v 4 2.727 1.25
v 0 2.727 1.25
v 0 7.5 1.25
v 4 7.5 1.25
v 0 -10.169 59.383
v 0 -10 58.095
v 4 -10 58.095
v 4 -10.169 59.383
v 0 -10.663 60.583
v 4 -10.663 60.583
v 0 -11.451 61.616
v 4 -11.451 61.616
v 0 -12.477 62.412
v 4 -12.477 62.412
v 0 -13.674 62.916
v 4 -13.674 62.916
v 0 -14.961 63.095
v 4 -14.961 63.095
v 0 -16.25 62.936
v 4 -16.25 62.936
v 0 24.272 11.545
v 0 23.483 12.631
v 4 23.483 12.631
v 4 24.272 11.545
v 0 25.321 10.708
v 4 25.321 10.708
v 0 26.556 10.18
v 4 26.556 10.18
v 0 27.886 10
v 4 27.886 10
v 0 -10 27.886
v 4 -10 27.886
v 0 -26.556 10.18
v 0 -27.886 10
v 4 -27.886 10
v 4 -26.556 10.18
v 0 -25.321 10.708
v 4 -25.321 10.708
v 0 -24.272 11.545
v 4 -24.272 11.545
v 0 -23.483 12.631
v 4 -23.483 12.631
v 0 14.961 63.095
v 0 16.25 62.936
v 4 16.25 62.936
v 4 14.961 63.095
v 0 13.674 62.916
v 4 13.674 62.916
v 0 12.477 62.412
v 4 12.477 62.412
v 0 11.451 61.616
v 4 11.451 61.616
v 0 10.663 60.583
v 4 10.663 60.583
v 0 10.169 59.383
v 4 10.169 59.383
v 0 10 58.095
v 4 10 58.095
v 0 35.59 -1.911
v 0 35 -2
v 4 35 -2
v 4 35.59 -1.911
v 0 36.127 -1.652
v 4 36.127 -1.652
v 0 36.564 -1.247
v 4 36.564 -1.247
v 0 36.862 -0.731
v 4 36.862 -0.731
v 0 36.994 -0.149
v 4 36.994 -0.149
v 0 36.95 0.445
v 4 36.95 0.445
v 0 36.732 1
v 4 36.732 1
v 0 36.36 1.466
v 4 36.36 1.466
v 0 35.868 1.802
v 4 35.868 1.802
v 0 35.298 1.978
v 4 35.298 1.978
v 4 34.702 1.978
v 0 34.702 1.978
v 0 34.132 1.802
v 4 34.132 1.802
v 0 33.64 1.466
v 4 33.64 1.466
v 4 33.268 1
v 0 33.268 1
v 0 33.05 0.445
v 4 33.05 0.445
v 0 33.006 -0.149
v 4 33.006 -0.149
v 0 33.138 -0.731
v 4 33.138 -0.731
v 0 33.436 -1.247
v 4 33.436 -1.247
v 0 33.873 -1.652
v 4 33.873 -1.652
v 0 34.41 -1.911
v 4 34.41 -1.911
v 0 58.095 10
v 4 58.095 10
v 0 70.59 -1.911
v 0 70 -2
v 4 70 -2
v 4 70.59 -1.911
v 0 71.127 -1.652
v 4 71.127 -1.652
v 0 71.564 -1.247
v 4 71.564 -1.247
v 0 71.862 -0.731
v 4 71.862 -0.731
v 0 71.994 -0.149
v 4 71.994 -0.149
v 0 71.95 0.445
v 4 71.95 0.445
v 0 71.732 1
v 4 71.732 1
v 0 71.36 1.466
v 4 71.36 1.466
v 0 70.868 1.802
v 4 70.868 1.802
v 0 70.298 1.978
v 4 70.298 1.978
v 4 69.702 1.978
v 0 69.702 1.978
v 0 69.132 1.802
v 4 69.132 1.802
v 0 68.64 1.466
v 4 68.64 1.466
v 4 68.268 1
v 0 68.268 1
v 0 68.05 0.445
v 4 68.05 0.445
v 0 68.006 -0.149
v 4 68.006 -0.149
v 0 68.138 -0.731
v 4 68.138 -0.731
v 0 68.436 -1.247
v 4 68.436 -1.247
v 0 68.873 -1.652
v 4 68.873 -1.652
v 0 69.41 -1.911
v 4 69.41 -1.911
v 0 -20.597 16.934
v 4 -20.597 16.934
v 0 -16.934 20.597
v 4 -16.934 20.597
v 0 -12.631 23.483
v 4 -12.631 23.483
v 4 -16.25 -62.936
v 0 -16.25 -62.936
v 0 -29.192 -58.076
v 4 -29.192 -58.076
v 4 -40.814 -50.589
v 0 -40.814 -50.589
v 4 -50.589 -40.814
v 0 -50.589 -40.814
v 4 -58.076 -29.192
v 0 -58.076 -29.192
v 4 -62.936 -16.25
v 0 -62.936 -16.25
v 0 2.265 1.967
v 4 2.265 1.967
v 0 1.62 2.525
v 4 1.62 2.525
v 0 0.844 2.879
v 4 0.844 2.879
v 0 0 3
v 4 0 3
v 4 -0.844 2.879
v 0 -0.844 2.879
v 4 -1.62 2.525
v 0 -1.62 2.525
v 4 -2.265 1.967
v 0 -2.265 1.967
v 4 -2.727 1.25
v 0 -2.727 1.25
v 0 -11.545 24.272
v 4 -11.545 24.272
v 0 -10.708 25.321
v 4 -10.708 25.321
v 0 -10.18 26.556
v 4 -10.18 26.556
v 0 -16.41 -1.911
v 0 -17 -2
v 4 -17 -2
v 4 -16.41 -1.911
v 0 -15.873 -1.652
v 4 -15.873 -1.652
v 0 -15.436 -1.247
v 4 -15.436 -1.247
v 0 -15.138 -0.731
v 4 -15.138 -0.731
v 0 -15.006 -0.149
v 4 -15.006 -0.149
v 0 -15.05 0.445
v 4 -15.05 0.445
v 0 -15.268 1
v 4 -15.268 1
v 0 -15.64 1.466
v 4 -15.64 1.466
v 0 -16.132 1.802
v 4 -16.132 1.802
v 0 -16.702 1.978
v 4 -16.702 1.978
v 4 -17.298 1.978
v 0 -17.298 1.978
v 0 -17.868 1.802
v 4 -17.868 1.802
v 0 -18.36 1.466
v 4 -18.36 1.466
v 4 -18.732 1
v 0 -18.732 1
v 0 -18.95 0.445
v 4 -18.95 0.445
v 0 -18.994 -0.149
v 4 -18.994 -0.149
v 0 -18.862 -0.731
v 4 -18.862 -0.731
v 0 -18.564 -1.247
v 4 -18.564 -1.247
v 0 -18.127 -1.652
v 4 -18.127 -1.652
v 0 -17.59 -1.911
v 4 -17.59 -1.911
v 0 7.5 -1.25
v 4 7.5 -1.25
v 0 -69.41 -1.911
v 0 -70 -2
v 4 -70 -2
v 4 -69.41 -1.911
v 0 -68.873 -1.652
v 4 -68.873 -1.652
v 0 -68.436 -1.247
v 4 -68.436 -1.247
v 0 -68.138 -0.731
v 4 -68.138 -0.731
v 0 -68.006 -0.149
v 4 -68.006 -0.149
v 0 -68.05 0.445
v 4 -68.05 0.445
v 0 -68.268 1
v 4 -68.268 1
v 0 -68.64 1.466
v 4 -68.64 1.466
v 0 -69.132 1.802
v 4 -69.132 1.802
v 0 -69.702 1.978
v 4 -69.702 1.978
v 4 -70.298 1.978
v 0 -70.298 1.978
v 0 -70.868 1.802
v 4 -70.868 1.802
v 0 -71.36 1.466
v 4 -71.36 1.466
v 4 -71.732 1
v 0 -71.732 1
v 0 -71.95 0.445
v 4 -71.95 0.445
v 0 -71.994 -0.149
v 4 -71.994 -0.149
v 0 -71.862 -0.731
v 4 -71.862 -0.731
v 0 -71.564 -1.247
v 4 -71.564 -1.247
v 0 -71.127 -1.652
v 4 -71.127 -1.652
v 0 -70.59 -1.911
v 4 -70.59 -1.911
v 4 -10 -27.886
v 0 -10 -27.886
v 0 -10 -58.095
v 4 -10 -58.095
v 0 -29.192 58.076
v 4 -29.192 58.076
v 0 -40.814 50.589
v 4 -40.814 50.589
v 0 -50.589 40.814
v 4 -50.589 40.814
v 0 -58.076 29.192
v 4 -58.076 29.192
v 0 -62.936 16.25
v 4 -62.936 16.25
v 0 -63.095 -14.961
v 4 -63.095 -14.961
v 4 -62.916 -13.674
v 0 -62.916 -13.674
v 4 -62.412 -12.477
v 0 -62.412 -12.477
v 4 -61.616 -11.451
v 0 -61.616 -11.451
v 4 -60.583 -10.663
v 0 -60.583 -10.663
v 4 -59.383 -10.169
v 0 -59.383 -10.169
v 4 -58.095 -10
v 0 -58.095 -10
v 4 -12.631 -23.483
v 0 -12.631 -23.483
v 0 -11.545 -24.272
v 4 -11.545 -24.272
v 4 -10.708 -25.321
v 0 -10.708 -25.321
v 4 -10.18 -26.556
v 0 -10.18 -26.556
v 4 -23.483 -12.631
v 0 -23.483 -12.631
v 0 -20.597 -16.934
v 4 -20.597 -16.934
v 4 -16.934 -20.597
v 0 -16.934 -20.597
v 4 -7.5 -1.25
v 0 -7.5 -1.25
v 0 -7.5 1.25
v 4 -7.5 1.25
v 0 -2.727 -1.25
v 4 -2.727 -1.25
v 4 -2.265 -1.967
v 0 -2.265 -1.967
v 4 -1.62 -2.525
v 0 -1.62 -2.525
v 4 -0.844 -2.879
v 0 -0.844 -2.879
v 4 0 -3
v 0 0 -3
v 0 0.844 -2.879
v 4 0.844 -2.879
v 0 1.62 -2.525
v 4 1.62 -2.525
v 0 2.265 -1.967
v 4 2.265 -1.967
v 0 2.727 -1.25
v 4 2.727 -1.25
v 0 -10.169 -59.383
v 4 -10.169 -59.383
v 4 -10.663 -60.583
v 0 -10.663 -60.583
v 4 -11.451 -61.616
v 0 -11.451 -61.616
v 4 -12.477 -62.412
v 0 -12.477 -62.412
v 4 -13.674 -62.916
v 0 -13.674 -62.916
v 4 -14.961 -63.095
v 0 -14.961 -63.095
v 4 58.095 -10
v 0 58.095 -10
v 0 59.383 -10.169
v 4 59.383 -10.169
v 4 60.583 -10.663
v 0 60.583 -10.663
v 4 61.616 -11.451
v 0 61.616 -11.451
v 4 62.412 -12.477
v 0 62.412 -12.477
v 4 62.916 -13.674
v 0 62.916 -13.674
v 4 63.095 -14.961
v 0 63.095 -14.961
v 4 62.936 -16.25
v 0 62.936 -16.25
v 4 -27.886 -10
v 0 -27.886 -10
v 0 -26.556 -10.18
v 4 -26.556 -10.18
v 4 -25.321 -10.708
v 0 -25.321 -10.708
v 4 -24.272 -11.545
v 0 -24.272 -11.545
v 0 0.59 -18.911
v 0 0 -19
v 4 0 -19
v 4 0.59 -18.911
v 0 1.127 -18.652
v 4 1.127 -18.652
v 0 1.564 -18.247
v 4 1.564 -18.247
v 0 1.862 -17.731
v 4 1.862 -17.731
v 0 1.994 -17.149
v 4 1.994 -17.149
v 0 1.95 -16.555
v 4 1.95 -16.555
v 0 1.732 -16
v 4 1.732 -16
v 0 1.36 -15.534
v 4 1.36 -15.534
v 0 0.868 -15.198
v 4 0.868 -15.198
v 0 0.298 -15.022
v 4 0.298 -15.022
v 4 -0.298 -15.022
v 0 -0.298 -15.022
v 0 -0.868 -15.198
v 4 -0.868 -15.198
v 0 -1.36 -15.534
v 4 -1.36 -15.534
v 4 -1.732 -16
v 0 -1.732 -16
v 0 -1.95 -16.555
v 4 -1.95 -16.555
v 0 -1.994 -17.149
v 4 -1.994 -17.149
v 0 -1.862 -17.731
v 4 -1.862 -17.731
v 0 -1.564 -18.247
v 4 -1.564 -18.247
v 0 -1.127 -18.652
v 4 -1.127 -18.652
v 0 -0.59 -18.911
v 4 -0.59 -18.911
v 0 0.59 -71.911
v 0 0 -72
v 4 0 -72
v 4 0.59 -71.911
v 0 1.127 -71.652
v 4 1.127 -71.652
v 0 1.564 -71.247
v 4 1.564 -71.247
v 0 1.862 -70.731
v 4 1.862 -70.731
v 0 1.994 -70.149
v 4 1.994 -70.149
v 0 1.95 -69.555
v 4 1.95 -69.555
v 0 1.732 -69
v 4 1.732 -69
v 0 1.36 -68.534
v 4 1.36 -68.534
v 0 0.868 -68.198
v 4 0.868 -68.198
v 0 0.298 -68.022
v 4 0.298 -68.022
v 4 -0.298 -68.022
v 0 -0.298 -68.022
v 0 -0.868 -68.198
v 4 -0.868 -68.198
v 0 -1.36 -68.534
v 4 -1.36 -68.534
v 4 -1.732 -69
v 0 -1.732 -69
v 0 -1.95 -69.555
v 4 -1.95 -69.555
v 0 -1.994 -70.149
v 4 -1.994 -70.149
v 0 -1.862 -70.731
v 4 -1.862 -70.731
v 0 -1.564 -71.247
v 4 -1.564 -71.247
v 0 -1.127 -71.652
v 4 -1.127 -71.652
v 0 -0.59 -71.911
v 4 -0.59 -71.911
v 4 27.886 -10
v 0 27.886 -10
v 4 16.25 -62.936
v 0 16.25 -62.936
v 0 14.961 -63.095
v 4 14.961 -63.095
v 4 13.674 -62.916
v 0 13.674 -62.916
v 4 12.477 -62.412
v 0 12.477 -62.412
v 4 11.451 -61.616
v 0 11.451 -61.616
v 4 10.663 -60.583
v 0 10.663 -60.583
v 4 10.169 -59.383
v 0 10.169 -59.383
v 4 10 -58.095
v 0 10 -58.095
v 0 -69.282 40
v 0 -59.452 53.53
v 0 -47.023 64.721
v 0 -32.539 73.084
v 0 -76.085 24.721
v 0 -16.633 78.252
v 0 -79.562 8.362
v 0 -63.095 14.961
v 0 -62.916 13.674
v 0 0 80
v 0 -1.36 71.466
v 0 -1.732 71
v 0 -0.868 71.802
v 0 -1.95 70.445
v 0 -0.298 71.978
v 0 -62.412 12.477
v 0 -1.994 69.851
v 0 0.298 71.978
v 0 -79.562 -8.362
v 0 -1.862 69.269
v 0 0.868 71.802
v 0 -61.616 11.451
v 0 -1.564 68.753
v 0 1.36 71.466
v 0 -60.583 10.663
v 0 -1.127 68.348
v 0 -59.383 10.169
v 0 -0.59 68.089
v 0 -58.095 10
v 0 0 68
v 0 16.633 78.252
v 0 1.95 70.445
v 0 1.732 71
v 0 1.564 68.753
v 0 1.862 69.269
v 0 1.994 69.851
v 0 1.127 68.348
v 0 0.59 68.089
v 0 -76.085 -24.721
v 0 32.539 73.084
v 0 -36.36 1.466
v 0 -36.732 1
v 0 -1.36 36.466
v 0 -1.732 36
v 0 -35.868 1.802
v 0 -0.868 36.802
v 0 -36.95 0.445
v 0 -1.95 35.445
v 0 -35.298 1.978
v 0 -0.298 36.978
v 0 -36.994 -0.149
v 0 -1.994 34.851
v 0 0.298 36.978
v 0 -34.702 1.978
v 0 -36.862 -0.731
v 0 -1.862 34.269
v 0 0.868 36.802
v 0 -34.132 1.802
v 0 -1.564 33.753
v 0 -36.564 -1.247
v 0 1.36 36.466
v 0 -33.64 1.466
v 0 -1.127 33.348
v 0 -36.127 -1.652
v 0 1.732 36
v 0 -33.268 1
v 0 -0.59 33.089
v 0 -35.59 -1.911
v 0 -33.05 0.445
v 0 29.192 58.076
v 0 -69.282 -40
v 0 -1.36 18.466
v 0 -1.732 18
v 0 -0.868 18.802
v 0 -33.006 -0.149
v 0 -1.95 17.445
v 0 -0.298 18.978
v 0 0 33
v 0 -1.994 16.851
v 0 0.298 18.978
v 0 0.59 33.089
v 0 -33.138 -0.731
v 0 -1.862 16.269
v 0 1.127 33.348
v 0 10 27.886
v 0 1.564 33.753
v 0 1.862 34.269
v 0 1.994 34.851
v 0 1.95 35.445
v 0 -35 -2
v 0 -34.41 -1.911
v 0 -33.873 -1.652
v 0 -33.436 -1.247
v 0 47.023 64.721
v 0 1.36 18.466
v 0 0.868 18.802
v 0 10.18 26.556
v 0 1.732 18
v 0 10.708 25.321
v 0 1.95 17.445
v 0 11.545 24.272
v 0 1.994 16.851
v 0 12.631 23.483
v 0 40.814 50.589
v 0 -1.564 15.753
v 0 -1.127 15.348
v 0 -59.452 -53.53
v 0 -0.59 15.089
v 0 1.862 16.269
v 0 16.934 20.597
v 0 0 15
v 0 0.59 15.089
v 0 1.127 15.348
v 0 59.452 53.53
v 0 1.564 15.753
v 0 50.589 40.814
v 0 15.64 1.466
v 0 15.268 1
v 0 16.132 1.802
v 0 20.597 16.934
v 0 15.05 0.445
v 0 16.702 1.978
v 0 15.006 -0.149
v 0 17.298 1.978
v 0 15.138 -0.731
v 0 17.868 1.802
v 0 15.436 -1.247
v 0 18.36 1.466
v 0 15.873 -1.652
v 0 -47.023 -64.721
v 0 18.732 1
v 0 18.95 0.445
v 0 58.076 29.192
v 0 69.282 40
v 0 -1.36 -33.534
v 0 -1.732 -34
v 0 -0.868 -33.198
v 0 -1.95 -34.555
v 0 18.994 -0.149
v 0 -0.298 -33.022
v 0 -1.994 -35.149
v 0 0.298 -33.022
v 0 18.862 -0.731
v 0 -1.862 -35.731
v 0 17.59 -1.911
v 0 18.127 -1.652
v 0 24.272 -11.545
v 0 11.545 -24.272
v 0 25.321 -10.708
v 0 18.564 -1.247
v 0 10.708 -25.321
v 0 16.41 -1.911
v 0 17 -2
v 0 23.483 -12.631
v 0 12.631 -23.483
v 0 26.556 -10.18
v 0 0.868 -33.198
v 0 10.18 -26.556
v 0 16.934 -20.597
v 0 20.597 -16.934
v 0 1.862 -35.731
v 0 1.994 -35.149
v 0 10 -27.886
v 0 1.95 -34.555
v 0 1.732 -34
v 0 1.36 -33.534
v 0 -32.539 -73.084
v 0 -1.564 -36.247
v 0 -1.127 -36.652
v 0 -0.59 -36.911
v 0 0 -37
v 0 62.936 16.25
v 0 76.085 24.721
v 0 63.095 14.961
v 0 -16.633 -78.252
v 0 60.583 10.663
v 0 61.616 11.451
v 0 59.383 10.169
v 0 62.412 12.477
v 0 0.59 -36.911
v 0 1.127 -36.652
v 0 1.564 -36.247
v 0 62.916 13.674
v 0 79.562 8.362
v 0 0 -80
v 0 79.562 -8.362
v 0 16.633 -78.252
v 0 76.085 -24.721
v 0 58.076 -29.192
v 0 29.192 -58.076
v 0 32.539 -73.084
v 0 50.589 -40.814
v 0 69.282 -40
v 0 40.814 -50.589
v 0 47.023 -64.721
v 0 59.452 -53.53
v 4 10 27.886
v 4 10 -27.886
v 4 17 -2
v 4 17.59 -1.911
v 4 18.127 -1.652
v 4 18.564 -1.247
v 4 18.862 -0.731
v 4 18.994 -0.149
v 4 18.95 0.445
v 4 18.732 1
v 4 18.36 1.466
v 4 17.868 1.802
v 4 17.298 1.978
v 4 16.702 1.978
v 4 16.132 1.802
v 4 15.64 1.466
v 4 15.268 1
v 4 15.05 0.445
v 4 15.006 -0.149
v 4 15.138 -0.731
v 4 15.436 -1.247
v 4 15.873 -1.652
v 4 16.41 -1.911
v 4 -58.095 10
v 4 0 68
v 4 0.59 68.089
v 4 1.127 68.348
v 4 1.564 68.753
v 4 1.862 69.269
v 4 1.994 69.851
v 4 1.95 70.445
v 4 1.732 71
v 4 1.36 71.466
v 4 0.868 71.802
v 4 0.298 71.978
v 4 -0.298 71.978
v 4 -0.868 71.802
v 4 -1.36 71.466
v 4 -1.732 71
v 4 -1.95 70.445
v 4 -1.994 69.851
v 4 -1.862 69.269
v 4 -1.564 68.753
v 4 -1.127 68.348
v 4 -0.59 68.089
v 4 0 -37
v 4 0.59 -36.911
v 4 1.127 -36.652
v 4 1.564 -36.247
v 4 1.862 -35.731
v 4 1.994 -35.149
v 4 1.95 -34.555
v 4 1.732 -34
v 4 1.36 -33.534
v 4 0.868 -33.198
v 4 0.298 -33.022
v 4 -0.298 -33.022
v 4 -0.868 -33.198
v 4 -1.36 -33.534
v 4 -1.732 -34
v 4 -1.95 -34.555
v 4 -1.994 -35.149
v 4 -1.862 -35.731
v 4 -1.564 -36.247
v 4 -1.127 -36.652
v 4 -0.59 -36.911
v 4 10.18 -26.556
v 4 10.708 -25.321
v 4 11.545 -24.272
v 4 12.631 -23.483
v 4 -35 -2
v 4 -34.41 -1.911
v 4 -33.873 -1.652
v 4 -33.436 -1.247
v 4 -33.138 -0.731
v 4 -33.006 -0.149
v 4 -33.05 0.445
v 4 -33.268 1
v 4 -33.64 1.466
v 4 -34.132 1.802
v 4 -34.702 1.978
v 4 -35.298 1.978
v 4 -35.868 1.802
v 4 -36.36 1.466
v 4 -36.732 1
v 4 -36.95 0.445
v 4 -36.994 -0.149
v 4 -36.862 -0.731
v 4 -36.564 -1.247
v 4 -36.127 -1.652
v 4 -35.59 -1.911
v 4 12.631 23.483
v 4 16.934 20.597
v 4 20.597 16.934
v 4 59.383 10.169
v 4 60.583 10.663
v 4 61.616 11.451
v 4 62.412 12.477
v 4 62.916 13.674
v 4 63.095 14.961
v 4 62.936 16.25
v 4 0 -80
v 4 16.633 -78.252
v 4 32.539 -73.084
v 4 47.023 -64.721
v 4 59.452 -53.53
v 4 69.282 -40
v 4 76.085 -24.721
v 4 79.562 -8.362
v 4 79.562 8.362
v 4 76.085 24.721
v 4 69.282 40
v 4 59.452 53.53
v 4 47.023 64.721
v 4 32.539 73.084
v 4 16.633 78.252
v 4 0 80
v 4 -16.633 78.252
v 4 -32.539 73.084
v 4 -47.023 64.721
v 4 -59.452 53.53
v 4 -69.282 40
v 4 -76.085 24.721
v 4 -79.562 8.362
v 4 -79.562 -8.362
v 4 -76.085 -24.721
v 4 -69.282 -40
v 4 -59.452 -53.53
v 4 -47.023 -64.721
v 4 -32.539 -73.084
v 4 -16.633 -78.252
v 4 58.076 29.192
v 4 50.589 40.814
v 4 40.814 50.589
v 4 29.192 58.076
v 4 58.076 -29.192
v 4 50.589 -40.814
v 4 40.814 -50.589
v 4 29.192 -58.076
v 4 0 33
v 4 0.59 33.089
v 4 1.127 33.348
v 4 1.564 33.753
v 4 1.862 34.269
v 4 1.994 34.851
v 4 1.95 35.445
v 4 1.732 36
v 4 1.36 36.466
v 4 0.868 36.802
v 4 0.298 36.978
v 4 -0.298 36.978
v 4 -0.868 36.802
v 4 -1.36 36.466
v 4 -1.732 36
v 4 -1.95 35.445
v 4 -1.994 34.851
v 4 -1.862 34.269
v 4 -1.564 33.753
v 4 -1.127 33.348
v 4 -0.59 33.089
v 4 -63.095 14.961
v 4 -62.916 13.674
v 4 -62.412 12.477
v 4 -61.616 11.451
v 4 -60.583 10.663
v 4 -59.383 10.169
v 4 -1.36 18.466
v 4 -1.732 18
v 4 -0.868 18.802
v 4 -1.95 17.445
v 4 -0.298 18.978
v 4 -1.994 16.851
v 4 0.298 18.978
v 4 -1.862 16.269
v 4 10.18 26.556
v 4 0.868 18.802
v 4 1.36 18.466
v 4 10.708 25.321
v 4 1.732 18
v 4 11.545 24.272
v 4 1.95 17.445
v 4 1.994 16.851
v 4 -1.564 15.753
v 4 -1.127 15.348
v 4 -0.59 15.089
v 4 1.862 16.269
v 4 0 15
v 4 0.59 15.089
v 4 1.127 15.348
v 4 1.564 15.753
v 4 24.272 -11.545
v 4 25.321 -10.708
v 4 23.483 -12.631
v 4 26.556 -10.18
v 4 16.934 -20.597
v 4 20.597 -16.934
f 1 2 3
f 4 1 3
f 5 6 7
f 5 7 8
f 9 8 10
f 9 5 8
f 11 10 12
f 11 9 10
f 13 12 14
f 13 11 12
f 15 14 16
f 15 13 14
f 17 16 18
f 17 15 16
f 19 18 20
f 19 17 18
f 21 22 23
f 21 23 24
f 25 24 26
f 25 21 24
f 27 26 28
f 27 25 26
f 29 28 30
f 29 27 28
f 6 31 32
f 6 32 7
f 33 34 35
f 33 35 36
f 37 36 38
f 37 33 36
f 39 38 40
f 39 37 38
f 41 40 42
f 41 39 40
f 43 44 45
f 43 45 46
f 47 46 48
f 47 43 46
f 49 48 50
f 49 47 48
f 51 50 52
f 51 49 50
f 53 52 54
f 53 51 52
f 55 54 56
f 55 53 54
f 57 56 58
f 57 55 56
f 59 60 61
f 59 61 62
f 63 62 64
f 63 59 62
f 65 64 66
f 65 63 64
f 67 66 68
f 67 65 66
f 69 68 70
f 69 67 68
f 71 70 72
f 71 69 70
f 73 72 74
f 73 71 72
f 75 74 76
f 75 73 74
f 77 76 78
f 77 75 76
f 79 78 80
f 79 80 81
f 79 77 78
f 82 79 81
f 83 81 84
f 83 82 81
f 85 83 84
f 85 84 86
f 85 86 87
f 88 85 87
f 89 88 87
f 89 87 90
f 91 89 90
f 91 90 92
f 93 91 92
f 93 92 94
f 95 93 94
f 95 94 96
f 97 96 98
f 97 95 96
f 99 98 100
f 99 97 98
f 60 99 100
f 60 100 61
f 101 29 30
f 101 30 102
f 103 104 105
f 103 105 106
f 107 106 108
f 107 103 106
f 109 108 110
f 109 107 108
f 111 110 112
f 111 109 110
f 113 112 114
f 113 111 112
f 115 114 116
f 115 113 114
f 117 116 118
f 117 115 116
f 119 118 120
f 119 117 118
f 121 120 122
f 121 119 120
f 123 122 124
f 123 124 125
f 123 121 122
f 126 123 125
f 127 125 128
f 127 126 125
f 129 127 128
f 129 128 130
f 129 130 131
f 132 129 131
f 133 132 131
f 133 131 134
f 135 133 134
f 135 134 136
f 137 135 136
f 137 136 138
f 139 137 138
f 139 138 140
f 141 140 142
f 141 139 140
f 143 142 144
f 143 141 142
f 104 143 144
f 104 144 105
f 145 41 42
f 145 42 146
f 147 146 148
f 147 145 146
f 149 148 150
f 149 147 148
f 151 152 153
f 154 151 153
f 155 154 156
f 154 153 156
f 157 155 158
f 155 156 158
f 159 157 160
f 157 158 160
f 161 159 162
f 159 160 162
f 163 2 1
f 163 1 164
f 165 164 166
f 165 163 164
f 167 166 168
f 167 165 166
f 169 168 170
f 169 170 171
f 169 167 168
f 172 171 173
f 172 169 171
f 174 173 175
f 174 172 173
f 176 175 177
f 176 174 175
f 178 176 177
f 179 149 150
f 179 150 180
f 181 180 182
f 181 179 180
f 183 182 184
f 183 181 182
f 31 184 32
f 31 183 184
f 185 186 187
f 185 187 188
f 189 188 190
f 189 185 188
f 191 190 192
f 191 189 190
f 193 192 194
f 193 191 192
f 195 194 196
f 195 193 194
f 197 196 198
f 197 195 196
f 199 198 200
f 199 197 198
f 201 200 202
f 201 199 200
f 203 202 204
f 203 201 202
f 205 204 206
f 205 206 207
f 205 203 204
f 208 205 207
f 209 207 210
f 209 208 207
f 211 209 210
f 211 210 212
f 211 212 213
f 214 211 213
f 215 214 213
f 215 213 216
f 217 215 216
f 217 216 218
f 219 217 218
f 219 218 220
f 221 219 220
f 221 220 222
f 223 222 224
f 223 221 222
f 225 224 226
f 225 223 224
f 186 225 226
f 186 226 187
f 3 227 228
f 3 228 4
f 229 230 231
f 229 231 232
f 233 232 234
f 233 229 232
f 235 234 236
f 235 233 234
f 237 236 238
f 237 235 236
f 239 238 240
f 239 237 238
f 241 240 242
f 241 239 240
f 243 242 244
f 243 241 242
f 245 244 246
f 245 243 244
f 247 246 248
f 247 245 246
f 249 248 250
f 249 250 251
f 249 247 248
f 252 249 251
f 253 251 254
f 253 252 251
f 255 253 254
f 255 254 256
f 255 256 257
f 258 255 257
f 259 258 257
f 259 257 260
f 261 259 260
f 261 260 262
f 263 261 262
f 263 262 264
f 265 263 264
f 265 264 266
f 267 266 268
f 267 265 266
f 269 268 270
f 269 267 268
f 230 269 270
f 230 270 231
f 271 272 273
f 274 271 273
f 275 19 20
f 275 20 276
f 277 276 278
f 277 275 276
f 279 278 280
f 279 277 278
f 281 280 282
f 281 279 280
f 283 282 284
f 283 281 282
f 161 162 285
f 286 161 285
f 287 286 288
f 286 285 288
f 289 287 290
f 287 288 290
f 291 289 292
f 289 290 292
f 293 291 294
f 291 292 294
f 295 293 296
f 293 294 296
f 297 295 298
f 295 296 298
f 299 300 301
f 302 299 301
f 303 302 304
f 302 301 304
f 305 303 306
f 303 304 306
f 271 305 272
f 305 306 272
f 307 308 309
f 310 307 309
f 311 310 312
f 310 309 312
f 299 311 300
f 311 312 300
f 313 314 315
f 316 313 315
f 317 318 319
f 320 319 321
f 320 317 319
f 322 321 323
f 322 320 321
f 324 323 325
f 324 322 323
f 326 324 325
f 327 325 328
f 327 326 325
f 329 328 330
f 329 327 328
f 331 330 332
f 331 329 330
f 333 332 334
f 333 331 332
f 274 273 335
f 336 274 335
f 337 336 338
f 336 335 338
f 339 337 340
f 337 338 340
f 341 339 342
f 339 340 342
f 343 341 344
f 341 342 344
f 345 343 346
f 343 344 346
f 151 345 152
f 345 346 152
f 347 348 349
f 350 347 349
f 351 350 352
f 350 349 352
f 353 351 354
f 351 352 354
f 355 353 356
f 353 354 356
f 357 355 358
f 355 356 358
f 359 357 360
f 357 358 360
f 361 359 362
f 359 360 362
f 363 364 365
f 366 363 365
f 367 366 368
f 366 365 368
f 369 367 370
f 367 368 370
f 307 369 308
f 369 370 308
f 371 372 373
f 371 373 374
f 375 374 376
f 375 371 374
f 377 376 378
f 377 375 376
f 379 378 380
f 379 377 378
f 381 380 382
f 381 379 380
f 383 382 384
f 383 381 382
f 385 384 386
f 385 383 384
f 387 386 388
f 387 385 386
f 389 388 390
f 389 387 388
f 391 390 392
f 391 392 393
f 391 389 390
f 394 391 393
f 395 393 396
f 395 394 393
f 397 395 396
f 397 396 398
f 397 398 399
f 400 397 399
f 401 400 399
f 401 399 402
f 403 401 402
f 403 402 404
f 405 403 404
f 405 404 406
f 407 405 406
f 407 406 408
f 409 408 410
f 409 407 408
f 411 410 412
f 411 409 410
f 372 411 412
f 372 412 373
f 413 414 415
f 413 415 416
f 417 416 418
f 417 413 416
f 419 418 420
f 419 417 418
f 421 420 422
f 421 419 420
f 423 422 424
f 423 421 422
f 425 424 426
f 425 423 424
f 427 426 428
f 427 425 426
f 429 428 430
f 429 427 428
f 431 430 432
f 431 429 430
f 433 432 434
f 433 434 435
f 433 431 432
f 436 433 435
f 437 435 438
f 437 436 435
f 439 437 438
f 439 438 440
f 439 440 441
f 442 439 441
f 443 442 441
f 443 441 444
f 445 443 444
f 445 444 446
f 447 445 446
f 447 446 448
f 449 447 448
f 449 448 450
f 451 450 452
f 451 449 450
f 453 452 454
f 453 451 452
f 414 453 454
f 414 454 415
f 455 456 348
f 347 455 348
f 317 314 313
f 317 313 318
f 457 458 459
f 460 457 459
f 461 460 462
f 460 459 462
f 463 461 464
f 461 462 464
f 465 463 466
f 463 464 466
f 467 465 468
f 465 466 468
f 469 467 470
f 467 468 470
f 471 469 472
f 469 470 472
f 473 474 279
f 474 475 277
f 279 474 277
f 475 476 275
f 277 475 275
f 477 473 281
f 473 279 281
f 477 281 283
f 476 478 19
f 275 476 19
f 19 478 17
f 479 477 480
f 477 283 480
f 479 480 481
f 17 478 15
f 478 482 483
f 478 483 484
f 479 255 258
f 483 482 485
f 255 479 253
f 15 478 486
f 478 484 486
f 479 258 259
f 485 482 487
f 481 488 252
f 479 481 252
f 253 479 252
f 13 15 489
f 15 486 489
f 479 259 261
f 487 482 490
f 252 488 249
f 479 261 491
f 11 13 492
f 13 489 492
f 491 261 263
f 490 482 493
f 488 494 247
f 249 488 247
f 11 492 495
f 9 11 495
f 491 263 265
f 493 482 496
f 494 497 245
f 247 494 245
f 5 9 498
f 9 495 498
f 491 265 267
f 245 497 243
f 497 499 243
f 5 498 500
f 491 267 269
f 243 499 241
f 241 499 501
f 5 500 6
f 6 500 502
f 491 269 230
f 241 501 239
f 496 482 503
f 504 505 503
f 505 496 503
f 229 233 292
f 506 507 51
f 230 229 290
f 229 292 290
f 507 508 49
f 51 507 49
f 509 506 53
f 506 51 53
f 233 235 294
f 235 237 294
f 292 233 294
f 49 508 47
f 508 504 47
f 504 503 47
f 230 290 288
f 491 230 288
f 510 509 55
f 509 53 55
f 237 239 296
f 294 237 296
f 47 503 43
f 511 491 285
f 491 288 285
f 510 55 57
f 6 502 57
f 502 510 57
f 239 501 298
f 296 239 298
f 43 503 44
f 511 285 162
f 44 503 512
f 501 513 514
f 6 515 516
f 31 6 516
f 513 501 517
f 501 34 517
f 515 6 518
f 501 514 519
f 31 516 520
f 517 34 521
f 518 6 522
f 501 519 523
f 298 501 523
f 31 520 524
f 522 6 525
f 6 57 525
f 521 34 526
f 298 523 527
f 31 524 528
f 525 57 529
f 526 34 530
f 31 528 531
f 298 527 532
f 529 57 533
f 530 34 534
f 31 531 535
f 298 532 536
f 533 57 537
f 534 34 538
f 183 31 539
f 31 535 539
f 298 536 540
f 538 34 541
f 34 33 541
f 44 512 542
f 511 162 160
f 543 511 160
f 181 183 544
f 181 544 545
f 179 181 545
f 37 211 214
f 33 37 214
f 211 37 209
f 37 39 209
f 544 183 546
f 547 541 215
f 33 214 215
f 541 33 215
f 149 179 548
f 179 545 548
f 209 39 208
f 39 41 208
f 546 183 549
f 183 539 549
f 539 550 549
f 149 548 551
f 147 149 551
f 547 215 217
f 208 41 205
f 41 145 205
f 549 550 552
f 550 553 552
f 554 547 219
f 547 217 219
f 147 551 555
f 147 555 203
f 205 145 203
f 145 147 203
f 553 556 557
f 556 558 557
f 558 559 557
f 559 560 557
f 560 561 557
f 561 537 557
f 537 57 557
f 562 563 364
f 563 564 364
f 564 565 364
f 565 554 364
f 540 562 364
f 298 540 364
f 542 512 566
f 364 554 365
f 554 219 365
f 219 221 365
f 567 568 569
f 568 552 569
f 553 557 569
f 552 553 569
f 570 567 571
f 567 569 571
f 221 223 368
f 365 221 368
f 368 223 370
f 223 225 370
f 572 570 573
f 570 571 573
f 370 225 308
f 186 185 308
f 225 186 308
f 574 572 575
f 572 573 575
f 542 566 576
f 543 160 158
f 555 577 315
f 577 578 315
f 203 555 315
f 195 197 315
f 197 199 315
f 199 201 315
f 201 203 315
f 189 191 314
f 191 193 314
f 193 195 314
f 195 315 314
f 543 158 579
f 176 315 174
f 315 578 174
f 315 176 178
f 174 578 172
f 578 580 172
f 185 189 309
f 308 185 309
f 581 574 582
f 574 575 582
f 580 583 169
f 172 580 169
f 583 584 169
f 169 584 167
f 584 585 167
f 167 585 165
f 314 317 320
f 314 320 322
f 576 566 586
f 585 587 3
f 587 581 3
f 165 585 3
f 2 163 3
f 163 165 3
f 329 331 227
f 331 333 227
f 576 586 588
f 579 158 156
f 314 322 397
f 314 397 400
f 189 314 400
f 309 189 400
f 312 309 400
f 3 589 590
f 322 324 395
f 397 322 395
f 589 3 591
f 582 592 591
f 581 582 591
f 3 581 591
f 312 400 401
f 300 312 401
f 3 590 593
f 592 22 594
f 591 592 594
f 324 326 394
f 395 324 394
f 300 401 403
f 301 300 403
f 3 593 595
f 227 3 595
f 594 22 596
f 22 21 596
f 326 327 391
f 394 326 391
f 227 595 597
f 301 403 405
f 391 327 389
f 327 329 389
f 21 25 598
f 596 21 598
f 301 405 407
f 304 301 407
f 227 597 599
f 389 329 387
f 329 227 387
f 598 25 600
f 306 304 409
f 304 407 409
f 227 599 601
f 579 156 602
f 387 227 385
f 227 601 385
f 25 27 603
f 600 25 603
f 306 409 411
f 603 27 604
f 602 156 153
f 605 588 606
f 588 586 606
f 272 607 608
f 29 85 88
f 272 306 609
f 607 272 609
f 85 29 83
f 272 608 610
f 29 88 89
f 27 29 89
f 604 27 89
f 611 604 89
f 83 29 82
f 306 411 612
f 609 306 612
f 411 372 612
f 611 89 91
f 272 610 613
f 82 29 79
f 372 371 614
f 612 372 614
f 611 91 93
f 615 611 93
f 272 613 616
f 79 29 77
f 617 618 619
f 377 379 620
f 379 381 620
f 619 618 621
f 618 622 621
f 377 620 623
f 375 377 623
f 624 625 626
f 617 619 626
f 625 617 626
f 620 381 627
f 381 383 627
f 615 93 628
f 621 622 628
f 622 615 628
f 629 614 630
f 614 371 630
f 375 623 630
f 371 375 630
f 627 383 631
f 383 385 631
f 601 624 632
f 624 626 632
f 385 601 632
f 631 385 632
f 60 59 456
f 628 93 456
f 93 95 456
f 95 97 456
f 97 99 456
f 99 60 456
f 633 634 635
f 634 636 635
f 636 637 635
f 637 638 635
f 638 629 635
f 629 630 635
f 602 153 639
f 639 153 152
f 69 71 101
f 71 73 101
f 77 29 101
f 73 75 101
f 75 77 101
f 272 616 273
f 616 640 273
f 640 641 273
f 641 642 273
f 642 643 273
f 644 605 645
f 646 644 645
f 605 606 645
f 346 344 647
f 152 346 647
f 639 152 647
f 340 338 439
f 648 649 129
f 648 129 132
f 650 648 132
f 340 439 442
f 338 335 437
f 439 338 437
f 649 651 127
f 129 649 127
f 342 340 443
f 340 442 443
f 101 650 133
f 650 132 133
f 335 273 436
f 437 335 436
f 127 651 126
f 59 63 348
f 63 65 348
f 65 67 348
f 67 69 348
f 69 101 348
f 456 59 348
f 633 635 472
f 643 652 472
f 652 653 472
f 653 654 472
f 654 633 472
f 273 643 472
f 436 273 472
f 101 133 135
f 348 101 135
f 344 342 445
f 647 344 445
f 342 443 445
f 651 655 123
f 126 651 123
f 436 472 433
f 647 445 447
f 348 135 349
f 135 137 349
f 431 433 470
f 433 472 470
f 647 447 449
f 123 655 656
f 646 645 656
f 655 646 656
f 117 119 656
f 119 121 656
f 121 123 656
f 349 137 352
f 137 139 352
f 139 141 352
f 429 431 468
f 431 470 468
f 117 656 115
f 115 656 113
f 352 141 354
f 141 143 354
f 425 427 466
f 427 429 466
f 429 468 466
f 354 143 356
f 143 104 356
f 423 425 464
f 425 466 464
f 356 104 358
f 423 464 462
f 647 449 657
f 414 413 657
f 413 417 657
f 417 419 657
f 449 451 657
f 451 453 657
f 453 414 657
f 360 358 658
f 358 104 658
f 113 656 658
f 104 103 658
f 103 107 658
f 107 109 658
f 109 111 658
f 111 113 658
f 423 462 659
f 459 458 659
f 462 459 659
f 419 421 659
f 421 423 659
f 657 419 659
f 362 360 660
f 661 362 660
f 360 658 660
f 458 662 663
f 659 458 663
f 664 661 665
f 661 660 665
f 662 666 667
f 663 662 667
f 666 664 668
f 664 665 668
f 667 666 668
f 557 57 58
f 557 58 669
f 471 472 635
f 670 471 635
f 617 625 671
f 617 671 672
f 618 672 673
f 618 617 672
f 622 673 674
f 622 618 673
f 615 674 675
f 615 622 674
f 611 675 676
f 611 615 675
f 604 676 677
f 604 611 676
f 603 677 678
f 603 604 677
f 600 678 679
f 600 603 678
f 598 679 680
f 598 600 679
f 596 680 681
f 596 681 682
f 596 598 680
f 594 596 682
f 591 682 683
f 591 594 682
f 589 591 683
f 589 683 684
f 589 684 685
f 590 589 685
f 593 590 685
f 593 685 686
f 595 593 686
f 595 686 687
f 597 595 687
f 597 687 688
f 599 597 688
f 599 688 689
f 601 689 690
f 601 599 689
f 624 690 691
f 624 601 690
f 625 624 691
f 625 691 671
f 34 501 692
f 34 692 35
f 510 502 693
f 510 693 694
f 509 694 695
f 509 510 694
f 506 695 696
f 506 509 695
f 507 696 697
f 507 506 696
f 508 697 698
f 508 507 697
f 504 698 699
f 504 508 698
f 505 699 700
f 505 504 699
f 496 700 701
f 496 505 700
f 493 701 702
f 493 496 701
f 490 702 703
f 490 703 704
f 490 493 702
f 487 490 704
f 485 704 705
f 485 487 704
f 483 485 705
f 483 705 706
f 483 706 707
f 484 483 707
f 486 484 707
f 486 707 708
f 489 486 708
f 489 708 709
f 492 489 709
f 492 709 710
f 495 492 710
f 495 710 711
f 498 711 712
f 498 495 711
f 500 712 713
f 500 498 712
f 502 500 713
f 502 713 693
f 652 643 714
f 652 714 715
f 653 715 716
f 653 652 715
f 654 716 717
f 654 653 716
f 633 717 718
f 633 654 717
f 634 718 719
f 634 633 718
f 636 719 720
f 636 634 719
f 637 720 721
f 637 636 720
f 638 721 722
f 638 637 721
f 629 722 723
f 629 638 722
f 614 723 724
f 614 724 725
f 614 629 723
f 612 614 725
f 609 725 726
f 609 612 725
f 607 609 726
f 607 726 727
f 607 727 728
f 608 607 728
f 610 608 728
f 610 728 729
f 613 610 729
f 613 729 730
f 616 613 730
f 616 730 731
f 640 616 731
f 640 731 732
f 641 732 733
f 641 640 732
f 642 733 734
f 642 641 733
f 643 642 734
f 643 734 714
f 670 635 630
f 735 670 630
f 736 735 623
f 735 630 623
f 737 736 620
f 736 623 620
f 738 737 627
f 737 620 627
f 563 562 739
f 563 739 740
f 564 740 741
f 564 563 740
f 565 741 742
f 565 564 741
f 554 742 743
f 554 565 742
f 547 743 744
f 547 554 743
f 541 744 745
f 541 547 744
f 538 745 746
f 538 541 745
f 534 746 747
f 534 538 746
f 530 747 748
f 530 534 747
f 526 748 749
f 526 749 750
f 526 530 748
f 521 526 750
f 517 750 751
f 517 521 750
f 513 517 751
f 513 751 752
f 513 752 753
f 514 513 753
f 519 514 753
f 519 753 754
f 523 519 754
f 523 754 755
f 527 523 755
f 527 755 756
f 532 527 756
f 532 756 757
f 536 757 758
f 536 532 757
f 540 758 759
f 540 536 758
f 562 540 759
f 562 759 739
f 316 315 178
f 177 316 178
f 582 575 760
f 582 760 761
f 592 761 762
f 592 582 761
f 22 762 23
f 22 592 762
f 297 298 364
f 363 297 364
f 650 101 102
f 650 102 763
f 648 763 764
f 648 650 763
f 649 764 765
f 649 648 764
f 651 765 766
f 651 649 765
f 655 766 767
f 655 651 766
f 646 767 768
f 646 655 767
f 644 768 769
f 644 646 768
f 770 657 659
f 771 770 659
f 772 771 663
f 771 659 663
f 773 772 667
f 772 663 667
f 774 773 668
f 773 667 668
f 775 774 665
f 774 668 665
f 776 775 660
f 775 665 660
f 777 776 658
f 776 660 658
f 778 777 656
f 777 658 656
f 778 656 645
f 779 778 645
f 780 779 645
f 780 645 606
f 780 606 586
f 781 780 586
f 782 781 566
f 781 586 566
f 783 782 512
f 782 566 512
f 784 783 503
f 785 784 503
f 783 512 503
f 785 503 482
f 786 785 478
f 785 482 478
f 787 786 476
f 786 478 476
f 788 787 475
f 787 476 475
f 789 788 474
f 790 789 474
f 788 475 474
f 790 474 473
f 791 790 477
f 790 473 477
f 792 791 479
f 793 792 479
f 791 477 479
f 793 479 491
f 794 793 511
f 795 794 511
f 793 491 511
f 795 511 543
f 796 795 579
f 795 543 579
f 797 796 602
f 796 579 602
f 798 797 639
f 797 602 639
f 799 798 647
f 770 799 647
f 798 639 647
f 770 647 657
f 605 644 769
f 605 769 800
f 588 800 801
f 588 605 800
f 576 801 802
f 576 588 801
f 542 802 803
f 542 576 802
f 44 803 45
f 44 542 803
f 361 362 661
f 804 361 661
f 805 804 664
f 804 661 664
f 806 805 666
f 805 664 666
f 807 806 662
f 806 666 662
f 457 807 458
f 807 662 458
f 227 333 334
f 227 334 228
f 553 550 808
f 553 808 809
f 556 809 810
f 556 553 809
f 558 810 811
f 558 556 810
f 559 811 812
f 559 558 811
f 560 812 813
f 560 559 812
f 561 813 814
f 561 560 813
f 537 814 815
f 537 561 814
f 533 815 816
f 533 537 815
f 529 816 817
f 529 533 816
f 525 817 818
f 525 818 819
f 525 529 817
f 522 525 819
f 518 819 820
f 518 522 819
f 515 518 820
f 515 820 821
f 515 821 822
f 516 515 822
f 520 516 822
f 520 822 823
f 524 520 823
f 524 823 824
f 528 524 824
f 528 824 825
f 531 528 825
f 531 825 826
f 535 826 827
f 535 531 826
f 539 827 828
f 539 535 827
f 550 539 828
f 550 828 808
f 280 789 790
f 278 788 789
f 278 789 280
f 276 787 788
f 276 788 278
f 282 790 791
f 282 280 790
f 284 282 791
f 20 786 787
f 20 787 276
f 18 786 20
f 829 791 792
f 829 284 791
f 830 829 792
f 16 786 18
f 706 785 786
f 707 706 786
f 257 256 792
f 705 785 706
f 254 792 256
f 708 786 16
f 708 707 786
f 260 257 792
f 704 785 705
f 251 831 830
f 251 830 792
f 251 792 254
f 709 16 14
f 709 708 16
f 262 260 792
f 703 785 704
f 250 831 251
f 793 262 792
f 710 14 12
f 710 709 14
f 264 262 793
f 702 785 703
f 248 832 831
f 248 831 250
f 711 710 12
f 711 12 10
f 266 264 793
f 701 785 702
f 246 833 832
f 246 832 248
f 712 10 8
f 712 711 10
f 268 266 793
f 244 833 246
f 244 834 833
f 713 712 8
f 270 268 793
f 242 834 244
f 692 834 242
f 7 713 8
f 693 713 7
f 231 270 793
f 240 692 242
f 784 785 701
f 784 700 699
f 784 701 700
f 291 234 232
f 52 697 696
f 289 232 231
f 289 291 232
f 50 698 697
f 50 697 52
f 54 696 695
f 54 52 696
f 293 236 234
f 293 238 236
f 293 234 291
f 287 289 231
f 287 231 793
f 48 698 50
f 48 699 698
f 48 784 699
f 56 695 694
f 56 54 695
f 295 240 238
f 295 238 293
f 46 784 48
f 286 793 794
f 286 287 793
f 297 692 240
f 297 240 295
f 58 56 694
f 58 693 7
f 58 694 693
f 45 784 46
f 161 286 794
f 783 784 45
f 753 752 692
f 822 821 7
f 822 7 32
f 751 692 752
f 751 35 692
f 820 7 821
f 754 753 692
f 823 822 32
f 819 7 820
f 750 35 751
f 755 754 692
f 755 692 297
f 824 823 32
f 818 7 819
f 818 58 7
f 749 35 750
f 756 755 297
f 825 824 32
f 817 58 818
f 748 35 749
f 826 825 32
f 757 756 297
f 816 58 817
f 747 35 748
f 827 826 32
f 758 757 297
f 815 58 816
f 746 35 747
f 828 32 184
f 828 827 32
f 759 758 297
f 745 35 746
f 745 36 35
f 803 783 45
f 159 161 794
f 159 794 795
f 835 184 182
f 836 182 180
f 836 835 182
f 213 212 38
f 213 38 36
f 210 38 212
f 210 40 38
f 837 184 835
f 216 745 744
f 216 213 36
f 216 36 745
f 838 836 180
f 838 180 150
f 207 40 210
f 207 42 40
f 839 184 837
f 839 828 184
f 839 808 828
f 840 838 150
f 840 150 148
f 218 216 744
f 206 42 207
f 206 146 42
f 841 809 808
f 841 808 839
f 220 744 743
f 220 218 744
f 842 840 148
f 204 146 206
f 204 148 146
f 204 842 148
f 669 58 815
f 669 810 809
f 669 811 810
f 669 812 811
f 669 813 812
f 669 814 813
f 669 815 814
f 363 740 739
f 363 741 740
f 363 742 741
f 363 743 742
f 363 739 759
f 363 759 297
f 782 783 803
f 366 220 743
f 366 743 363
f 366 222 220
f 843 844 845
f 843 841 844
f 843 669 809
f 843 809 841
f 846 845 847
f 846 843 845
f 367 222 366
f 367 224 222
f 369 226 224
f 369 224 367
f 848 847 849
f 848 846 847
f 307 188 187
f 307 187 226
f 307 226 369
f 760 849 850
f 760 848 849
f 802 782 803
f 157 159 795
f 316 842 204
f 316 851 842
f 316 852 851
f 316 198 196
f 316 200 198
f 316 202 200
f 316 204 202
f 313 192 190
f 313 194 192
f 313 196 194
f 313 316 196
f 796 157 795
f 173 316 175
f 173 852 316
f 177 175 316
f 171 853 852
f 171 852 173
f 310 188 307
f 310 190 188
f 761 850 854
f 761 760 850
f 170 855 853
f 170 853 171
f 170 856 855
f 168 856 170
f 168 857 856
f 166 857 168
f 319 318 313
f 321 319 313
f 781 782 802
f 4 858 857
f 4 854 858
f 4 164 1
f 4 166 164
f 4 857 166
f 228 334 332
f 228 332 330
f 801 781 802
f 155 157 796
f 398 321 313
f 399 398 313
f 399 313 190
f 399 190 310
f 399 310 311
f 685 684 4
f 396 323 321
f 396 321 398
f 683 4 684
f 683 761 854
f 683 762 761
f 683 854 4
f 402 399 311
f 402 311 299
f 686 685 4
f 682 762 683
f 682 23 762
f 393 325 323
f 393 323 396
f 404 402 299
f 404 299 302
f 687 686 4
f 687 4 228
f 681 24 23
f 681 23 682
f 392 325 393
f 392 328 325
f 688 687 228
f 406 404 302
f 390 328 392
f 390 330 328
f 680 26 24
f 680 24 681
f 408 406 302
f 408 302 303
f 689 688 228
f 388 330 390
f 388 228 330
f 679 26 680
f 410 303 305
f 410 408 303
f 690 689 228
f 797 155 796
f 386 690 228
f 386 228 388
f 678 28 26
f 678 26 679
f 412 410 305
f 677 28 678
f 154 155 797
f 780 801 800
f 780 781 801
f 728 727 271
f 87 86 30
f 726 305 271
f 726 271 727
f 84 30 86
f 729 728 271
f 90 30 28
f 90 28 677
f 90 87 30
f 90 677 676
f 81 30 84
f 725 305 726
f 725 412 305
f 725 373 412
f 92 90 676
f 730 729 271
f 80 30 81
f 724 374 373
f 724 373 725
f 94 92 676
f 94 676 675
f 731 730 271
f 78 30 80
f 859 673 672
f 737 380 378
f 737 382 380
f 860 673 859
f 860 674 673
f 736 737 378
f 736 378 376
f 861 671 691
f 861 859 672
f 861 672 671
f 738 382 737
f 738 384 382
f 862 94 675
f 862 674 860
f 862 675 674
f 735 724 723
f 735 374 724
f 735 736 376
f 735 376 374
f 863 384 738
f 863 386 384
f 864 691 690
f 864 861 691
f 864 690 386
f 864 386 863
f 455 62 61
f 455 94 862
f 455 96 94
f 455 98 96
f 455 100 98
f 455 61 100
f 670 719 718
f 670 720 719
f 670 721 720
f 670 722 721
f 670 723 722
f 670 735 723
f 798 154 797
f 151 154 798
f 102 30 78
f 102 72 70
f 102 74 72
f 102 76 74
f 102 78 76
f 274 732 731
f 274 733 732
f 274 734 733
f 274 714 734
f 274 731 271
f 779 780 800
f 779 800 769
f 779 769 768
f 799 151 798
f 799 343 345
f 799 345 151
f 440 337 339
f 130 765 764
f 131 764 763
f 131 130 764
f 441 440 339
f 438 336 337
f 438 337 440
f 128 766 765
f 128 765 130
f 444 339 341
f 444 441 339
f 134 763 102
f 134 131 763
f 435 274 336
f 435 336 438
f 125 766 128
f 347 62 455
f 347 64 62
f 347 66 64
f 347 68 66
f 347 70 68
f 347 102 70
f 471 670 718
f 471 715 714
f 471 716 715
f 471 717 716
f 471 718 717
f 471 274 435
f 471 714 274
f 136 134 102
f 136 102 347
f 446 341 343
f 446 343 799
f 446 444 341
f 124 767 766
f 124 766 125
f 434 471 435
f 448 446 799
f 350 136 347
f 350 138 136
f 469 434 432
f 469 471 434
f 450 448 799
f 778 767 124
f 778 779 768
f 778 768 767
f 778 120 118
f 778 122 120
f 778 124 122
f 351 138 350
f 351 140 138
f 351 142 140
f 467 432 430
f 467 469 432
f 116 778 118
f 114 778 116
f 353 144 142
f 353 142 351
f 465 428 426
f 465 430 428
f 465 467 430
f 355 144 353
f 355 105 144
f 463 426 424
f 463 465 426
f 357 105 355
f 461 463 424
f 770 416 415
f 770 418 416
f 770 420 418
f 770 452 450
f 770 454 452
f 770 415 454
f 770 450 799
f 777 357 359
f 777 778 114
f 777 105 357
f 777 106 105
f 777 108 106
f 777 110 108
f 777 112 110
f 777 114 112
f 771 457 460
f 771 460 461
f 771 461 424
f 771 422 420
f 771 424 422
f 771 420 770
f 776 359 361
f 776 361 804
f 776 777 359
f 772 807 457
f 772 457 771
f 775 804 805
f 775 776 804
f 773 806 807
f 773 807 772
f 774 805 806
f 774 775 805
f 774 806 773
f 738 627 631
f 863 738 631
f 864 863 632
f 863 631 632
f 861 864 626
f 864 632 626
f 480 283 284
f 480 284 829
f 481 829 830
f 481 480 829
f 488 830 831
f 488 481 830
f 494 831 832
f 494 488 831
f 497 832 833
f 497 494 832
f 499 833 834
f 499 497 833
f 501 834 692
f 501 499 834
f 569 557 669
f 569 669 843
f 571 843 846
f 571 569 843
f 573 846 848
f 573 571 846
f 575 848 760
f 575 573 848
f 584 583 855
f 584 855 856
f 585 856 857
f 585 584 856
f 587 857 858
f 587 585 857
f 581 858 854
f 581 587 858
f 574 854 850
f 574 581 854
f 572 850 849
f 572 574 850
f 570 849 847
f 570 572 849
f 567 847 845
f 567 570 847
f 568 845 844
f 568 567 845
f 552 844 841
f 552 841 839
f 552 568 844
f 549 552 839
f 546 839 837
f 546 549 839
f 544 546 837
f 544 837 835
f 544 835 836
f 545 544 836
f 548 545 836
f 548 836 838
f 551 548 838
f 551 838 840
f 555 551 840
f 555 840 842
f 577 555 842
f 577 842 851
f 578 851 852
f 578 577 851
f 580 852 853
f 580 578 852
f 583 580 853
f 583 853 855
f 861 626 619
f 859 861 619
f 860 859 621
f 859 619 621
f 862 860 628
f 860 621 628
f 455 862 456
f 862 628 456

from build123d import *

# Parameters (mm, degrees)
SKETCH1_R           = 80
SKETCH1_R_2         = 2
SKETCH1_R_3         = 3
BOSS_EXTRUDE1_DEPTH = 4
SKETCH2_W           = 2.5
SKETCH2_H           = 15
CUT_EXTRUDE1_DEPTH  = 10


with BuildPart() as part:
    # Sketch1 → Boss-Extrude1 (new body)
    with BuildSketch(Plane(origin=(0, 0, 0), x_dir=(0, 0, -1), z_dir=(1, 0, 0))):
        Circle(SKETCH1_R)
        with Locations((0, 17)):
            Circle(SKETCH1_R_2, mode=Mode.SUBTRACT)
        with Locations((0, 35)):
            Circle(SKETCH1_R_2, mode=Mode.SUBTRACT)
        with Locations((0, 70)):
            Circle(SKETCH1_R_2, mode=Mode.SUBTRACT)
        with Locations((70, 0)):
            Circle(SKETCH1_R_2, mode=Mode.SUBTRACT)
        with Locations((35, 0)):
            Circle(SKETCH1_R_2, mode=Mode.SUBTRACT)
        with Locations((0, -70)):
            Circle(SKETCH1_R_2, mode=Mode.SUBTRACT)
        with Locations((0, -35)):
            Circle(SKETCH1_R_2, mode=Mode.SUBTRACT)
        with Locations((-70, 0)):
            Circle(SKETCH1_R_2, mode=Mode.SUBTRACT)
        with Locations((-35, 0)):
            Circle(SKETCH1_R_2, mode=Mode.SUBTRACT)
        with Locations((17, 0)):
            Circle(SKETCH1_R_2, mode=Mode.SUBTRACT)
        with Locations((0, -17)):
            Circle(SKETCH1_R_2, mode=Mode.SUBTRACT)
        Circle(SKETCH1_R_3, mode=Mode.SUBTRACT)
        with Locations((-17, 0)):
            Circle(SKETCH1_R_2, mode=Mode.SUBTRACT)
        with BuildLine():
            Line((-10, 27.886232268), (-10, 58.094750193))
            ThreePointArc((-10, 58.094750193), (-11.938137822, 62.047597268), (-16.25, 62.935979376))
            ThreePointArc((-16.25, 62.935979376), (-45.961940777, 45.961940777), (-62.935979376, 16.25))
            ThreePointArc((-62.935979376, 16.25), (-62.047597268, 11.938137822), (-58.094750193, 10))
            Line((-58.094750193, 10), (-27.886232268, 10))
            ThreePointArc((-27.886232268, 10), (-25.321364567, 10.707977903), (-23.482844729, 12.631418528))
            ThreePointArc((-23.482844729, 12.631418528), (-18.854664285, 18.854664285), (-12.631418528, 23.482844729))
            ThreePointArc((-12.631418528, 23.482844729), (-10.707977903, 25.321364567), (-10, 27.886232268))
        make_face(mode=Mode.SUBTRACT)
        with BuildLine():
            Line((-10, -58.094750193), (-10, -27.886232268))
            ThreePointArc((-10, -27.886232268), (-10.707977903, -25.321364567), (-12.631418528, -23.482844729))
            ThreePointArc((-12.631418528, -23.482844729), (-18.854664285, -18.854664285), (-23.482844729, -12.631418528))
            ThreePointArc((-23.482844729, -12.631418528), (-25.321364567, -10.707977903), (-27.886232268, -10))
            Line((-27.886232268, -10), (-58.094750193, -10))
            ThreePointArc((-58.094750193, -10), (-62.047597268, -11.938137822), (-62.935979376, -16.25))
            ThreePointArc((-62.935979376, -16.25), (-45.961940777, -45.961940777), (-16.25, -62.935979376))
            ThreePointArc((-16.25, -62.935979376), (-11.938137822, -62.047597268), (-10, -58.094750193))
        make_face(mode=Mode.SUBTRACT)
        with BuildLine():
            Line((10, -58.094750193), (10, -27.886232268))
            ThreePointArc((10, -27.886232268), (10.707977903, -25.321364567), (12.631418528, -23.482844729))
            ThreePointArc((12.631418528, -23.482844729), (18.854664285, -18.854664285), (23.482844729, -12.631418528))
            ThreePointArc((23.482844729, -12.631418528), (25.321364567, -10.707977903), (27.886232268, -10))
            Line((27.886232268, -10), (58.094750193, -10))
            ThreePointArc((58.094750193, -10), (62.047597268, -11.938137822), (62.935979376, -16.25))
            ThreePointArc((62.935979376, -16.25), (45.961940777, -45.961940777), (16.25, -62.935979376))
            ThreePointArc((16.25, -62.935979376), (11.938137822, -62.047597268), (10, -58.094750193))
        make_face(mode=Mode.SUBTRACT)
        with BuildLine():
            Line((10, 27.886232268), (10, 58.094750193))
            ThreePointArc((10, 58.094750193), (11.938137822, 62.047597268), (16.25, 62.935979376))
            ThreePointArc((16.25, 62.935979376), (45.961940777, 45.961940777), (62.935979376, 16.25))
            ThreePointArc((62.935979376, 16.25), (62.047597268, 11.938137822), (58.094750193, 10))
            Line((58.094750193, 10), (27.886232268, 10))
            ThreePointArc((27.886232268, 10), (25.321364567, 10.707977903), (23.482844729, 12.631418528))
            ThreePointArc((23.482844729, 12.631418528), (18.854664285, 18.854664285), (12.631418528, 23.482844729))
            ThreePointArc((12.631418528, 23.482844729), (10.707977903, 25.321364567), (10, 27.886232268))
        make_face(mode=Mode.SUBTRACT)
    extrude(amount=BOSS_EXTRUDE1_DEPTH)

    # Sketch2 → Cut-Extrude1 (cut)
    with BuildSketch(Plane.ZY):
        Rectangle(SKETCH2_W, SKETCH2_H)
    extrude(amount=-CUT_EXTRUDE1_DEPTH, mode=Mode.SUBTRACT)


solid = part.part
